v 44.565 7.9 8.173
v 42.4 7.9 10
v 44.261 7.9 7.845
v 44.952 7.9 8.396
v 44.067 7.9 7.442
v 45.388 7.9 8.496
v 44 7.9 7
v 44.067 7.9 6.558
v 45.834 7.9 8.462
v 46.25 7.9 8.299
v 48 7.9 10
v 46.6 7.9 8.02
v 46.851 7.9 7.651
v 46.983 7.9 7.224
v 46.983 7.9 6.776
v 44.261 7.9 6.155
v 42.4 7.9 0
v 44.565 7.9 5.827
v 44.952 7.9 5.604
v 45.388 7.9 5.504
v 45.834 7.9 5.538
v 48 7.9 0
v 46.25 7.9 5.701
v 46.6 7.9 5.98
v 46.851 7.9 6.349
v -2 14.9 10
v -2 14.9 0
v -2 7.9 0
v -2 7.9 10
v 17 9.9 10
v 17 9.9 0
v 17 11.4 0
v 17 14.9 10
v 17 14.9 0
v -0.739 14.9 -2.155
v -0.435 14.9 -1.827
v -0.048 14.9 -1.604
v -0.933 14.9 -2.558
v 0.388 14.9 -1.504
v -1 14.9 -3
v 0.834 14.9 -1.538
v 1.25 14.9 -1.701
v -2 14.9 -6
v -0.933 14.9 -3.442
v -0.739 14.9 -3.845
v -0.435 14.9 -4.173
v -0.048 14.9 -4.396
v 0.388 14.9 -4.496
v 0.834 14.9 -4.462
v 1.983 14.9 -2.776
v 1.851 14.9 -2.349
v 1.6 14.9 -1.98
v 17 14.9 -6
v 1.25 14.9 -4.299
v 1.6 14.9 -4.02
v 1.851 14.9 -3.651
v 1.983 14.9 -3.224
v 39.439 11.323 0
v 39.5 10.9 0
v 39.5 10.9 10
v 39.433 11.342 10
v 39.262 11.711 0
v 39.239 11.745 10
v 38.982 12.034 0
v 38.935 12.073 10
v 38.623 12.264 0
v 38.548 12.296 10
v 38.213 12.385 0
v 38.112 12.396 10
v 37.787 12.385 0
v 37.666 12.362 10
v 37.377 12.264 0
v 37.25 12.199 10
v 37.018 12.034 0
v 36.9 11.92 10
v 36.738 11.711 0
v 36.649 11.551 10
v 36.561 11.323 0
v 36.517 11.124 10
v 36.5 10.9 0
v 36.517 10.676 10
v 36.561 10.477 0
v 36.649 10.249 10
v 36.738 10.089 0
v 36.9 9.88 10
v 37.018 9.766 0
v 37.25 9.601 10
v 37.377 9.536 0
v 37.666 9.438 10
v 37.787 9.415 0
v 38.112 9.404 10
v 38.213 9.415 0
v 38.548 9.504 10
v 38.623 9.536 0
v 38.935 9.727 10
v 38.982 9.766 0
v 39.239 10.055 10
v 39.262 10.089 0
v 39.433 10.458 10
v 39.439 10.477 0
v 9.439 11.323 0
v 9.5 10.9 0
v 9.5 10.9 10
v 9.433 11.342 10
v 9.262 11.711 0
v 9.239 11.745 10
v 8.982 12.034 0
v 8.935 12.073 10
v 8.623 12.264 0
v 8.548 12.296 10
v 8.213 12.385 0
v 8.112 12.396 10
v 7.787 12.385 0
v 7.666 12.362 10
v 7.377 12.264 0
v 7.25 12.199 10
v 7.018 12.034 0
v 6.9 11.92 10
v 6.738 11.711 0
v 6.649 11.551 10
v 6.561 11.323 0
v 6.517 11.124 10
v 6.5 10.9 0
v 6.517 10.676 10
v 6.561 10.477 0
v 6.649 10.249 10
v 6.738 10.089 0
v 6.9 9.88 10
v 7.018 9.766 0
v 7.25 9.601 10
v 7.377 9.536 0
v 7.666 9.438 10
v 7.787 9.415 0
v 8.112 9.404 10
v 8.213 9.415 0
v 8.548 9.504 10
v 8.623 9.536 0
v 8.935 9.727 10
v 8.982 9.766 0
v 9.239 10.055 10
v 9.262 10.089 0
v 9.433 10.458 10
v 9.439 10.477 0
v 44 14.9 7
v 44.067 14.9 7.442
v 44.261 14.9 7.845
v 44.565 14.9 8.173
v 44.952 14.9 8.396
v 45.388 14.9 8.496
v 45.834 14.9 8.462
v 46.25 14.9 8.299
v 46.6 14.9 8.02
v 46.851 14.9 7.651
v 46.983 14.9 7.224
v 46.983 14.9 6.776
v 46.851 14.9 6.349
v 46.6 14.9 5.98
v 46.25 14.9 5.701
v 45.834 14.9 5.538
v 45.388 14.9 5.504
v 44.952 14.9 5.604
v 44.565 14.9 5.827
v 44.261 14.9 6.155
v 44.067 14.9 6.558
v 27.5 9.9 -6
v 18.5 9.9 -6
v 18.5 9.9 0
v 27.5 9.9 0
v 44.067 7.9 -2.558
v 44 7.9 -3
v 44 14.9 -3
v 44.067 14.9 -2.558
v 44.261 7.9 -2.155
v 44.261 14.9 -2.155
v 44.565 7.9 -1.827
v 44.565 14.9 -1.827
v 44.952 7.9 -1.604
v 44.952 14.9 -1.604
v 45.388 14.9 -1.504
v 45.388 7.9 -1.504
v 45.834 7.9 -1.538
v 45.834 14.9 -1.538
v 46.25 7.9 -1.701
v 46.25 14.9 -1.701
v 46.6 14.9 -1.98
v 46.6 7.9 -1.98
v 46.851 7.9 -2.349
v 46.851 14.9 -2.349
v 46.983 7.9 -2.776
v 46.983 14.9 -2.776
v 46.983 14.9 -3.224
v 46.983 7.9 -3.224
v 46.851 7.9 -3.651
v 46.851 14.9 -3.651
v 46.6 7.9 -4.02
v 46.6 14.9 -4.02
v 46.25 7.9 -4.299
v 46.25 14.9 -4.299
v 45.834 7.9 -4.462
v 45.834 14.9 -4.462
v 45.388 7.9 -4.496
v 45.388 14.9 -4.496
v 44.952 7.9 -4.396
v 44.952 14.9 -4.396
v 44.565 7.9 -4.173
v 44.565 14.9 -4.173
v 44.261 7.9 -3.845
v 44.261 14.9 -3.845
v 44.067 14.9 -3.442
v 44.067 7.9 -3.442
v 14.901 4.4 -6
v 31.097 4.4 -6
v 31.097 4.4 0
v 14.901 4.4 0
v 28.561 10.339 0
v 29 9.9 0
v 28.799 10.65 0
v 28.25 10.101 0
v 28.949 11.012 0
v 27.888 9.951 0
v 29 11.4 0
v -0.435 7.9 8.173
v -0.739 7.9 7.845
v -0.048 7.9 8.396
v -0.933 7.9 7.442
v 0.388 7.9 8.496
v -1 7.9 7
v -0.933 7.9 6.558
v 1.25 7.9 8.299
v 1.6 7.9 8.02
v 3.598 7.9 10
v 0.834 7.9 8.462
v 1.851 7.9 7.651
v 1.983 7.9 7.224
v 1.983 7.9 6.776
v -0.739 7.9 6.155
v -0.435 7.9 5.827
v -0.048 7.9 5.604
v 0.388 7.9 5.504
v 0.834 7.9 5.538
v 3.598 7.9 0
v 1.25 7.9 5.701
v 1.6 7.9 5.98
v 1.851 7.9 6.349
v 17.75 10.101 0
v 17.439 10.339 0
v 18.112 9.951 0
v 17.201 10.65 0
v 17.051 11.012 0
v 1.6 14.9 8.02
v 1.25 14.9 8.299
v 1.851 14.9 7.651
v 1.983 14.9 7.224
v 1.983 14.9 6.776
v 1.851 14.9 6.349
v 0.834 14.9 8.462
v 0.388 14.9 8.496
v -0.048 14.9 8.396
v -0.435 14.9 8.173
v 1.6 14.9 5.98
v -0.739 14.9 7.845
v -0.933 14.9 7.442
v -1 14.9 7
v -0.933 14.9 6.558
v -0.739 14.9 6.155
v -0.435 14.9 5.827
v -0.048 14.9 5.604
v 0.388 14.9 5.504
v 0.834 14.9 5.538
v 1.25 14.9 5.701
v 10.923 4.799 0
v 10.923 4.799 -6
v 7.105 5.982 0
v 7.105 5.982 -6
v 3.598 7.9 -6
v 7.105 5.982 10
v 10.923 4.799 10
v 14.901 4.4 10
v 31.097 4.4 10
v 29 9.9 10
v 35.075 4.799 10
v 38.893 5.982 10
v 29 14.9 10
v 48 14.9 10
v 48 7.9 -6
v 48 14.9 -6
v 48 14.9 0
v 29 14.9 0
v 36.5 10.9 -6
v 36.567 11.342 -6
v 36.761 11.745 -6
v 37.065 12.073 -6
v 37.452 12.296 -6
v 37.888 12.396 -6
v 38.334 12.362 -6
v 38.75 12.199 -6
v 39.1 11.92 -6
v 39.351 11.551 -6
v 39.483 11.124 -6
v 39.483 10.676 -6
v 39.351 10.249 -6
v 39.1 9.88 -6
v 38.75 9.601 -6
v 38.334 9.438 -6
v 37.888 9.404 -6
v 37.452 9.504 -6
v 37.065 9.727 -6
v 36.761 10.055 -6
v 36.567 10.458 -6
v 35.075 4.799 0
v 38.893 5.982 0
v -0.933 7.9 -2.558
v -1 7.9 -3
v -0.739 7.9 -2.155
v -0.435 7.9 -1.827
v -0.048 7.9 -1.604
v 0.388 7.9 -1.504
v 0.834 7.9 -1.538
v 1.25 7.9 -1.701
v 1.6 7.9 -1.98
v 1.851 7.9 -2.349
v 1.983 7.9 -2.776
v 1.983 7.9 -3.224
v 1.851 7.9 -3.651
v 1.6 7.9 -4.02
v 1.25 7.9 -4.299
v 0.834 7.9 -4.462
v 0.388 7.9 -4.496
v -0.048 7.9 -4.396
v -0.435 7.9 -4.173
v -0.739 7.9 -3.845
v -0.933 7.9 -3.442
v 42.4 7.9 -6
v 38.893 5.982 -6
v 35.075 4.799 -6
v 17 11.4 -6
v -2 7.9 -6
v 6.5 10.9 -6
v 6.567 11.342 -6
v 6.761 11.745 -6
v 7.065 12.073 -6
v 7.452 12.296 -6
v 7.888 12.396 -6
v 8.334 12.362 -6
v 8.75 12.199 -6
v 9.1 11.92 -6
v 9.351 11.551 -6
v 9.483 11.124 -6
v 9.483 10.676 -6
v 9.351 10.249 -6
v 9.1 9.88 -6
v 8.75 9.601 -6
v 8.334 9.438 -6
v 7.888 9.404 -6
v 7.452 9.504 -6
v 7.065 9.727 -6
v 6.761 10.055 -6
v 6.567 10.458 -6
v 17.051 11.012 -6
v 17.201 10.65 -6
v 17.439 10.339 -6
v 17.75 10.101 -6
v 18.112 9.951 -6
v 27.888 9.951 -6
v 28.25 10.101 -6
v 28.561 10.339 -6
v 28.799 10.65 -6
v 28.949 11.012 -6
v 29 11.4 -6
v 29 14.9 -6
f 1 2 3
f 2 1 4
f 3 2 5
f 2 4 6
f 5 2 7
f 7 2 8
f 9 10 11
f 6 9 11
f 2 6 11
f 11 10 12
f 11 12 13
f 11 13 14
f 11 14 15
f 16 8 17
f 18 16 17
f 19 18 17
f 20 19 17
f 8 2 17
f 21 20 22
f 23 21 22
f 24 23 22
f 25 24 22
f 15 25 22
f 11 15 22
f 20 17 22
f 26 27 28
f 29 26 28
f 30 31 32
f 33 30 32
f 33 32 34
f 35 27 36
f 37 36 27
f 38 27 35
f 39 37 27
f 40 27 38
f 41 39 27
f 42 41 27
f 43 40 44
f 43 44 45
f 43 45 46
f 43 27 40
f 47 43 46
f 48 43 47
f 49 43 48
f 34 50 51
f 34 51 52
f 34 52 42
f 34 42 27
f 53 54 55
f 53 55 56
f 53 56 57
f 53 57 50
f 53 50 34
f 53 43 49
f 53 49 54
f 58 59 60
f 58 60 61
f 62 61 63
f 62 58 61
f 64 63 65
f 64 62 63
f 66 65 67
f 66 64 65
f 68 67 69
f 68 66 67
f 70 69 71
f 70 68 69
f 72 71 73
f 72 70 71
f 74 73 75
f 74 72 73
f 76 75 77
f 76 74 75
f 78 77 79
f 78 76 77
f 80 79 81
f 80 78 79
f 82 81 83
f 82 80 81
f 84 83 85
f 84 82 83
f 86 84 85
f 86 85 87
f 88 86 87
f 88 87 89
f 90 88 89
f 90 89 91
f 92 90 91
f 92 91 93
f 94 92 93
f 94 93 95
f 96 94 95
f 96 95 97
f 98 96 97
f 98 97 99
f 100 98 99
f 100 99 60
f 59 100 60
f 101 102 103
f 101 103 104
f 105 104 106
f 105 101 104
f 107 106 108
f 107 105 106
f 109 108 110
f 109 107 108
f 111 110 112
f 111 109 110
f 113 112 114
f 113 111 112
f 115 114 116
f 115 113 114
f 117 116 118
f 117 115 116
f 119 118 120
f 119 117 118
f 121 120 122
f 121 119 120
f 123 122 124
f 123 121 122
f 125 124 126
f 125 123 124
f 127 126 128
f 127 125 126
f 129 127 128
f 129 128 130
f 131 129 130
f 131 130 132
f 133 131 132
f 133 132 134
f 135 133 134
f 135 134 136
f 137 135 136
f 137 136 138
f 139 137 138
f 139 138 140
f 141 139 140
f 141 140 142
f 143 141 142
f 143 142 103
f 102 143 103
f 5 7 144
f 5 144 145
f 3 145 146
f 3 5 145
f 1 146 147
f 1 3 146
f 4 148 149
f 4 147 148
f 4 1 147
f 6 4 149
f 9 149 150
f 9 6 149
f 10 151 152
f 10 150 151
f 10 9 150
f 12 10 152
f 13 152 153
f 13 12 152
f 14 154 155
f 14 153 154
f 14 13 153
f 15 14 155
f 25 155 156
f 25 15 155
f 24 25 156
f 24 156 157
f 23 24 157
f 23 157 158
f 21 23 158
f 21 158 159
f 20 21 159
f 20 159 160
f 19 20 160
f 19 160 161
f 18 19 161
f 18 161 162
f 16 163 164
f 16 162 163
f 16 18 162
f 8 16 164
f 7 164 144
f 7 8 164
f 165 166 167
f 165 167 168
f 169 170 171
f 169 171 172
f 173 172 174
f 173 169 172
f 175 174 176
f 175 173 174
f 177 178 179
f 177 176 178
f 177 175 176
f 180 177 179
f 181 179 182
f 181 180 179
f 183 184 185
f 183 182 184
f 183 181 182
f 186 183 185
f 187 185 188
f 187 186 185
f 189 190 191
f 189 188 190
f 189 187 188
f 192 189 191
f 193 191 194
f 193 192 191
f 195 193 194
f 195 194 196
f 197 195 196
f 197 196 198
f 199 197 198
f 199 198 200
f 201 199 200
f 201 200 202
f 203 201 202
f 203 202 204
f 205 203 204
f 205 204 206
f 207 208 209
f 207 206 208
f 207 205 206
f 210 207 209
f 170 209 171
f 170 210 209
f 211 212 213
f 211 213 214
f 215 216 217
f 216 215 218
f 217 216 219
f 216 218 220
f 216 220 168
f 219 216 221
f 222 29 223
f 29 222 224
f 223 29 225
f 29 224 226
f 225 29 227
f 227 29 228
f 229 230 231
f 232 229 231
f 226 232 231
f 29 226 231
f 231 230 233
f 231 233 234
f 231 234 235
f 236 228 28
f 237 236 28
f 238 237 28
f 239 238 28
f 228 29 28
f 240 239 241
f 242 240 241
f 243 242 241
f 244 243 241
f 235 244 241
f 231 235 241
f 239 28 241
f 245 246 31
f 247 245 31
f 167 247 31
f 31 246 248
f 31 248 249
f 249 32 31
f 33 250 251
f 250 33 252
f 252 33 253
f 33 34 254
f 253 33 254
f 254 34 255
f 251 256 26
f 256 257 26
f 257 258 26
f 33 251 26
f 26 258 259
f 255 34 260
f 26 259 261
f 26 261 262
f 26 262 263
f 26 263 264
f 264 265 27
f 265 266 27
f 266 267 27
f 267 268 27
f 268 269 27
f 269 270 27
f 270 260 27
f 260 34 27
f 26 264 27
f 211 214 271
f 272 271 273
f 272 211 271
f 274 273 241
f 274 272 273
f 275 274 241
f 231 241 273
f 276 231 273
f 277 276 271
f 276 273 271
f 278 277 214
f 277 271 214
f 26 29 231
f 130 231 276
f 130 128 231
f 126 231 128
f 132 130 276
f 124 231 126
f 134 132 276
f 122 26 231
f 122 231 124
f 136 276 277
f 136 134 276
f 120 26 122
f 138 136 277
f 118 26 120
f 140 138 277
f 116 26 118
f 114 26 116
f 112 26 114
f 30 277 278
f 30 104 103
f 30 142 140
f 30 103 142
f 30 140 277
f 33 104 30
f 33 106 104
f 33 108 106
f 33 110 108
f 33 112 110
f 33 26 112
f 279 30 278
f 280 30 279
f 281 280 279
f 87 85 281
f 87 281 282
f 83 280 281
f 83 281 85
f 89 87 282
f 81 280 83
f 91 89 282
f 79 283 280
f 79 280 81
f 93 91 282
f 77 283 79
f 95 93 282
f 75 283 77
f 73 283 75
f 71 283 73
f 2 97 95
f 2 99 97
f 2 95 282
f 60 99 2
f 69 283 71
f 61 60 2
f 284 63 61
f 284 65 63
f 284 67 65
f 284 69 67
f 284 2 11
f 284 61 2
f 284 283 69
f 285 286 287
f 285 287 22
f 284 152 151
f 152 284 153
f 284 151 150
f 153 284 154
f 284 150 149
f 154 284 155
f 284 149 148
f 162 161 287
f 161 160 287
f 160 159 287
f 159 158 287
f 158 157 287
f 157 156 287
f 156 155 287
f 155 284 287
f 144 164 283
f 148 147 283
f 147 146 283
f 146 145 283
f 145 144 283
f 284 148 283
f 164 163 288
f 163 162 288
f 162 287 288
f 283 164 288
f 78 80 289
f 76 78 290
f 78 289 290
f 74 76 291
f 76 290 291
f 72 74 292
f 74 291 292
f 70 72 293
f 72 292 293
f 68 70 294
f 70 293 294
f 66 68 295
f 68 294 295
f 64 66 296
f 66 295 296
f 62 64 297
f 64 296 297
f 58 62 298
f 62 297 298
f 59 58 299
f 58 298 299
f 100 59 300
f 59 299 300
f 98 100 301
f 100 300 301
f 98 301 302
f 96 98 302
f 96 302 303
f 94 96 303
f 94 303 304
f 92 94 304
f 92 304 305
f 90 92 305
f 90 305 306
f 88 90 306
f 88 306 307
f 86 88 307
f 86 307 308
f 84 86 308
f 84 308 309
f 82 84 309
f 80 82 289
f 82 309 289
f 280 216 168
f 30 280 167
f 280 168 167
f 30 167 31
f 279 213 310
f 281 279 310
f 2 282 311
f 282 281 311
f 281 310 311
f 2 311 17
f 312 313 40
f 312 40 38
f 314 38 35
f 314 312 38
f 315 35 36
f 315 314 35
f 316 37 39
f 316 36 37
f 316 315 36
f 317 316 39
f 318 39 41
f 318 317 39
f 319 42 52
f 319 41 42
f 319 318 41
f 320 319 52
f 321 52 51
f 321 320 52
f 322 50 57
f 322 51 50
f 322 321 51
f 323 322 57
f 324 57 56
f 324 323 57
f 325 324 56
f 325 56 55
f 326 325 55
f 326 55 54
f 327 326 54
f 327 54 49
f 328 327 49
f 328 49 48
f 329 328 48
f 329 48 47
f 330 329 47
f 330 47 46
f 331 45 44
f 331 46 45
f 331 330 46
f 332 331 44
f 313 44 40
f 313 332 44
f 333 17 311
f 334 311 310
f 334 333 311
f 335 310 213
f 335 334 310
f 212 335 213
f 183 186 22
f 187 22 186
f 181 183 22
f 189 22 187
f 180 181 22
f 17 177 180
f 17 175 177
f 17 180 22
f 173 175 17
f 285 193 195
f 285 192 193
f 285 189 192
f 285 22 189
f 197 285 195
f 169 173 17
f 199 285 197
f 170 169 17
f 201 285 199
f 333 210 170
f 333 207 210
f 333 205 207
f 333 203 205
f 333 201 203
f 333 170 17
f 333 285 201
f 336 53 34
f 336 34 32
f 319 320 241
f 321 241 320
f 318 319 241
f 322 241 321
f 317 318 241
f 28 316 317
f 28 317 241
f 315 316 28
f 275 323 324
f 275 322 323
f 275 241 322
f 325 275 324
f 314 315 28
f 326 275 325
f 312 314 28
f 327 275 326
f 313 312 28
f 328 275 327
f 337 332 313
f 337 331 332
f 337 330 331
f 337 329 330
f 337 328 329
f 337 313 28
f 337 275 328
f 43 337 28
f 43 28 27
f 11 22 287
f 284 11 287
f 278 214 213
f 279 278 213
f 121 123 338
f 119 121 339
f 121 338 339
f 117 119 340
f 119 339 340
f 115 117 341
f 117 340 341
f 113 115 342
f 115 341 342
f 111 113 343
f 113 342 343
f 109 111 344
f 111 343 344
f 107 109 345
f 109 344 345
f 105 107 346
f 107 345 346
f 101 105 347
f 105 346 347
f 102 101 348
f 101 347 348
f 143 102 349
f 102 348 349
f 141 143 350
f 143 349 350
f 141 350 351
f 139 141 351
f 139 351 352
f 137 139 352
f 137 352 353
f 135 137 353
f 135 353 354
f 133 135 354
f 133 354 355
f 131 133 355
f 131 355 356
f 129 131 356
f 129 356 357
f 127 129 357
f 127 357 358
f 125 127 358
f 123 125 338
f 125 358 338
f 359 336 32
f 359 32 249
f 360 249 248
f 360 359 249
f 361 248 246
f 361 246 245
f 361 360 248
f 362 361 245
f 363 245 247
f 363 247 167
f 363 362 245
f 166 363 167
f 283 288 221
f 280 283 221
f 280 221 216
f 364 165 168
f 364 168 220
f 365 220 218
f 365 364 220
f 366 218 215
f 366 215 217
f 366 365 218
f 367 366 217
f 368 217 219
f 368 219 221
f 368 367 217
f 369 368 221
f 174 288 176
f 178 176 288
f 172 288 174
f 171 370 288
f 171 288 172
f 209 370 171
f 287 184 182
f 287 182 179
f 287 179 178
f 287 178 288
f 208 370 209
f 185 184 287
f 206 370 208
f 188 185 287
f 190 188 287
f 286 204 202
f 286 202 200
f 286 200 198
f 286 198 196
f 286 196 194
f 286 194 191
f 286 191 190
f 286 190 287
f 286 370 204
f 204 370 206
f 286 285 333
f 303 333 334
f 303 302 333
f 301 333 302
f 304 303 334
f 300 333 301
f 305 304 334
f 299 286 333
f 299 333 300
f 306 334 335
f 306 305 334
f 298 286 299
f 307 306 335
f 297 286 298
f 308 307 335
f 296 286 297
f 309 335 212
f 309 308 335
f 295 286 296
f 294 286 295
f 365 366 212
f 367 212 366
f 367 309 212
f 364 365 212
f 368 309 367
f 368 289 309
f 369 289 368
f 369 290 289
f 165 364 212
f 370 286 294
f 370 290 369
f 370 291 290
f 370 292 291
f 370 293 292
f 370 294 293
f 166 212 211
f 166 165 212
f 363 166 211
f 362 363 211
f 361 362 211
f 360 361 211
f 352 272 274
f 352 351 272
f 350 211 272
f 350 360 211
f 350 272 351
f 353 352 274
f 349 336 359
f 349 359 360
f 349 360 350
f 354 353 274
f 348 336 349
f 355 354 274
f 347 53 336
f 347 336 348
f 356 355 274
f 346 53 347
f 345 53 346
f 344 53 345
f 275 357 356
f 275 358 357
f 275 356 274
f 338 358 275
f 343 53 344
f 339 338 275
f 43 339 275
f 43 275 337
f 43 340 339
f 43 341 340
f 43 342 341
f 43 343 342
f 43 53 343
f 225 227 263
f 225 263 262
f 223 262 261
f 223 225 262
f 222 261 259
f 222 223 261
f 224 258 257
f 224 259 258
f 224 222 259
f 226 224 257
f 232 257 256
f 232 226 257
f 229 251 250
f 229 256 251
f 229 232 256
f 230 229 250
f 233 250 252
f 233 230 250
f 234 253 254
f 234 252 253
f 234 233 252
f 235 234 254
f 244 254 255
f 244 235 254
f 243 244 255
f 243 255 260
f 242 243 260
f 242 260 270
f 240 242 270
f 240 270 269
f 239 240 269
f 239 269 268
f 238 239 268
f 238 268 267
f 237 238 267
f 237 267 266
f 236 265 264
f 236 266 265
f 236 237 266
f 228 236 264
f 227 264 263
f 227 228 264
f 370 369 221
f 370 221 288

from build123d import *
from build123d.topology import SkipClean

# Parameters (mm, degrees)
SKETCH7_R               = 1.5
BOSS_EXTRUDE11_DEPTH    = 10
FILLET1_R               = 20
BOSS_EXTRUDE12_START    = 6
SKETCH9_R               = 1.5
BOSS_EXTRUDE12_DEPTH    = 6
CUT_EXTRUDE1_DEPTH      = 51.142297514
CUT_EXTRUDE1_DEPTH_BACK = 51.142297514
SKETCH10_R              = 1.5


with BuildPart() as part:
    # Sketch7 → Boss-Extrude11 (new body)
    with BuildSketch(Plane.XY):
        Polygon((11, 14.9), (-2, 14.9), (-2, 7.9), (3.598076211, 7.9), (3.598076211, 4.4), (42.4, 4.4), (42.4, 7.9), (48, 7.9), (48, 14.9), (35, 14.9), (29, 14.9), (29, 9.9), (17, 9.9), (17, 14.9), align=None)
        with Locations((8, 10.9)):
            Circle(SKETCH7_R, mode=Mode.SUBTRACT)
        with Locations((38, 10.9)):
            Circle(SKETCH7_R, mode=Mode.SUBTRACT)
    extrude(amount=BOSS_EXTRUDE11_DEPTH)

    # Fillet1
    # the kernel refuses this fillet: 20 mm, written as the material it takes off along each edge
    with BuildSketch(Plane(origin=(42.4, 4.4, -28.256636389), x_dir=(-1.4210854715172548e-12, 1.0, 0), z_dir=(0, 0, 1))) as fillet1_piece_1:
        with BuildLine():
            CenterArc((20, 11.302654555), FILLET1_R, 180, 34.41150867)
            Line((0, 11.302654555), (-0.4, 11.302654555))
            Line((-0.4, 11.302654555), (-0.4, 0))
            Line((-0.4, 0), (0, -0.4))
            ThreePointArc((0, -0.4), (1.75, -0.4), (3.17, -0.226053091))
            Line((3.17, -0.226053091), (3.5, 0))
        make_face()
    extrude(amount=66.513272777, mode=Mode.SUBTRACT)
    with BuildSketch(Plane(origin=(3.598076211, 4.4, -28.256636389), x_dir=(1, 0, 0), z_dir=(0, 0, 1))) as fillet1_piece_2:
        with BuildLine():
            CenterArc((11.302654555, 20), FILLET1_R, 235.58849133, 34.41150867)
            Line((0, 3.5), (-0.226053091, 3.17))
            ThreePointArc((-0.226053091, 3.17), (-0.4, 1.75), (-0.4, 0))
            Line((-0.4, 0), (0, -0.4))
            Line((0, -0.4), (11.302654555, -0.4))
            Line((11.302654555, -0.4), (11.302654555, 0))
        make_face()
    extrude(amount=66.513272777, mode=Mode.SUBTRACT)

    # Sketch9 → Boss-Extrude12 (add)
    with SkipClean():  # the faces are left unmerged after this step: merging them gives an invalid solid
        with BuildSketch(Plane(origin=(0, 0, 0), x_dir=(-1, 0, 0), z_dir=(0, 0, -1)).offset(BOSS_EXTRUDE12_START)):
            with BuildLine():
                Line((-48, 7.9), (-42.4, 7.9))
                ThreePointArc((-42.4, 7.9), (-37.013425228, 5.295026825), (-31.097345445, 4.4))
                Line((-31.097345445, 4.4), (-14.900730767, 4.4))
                ThreePointArc((-14.900730767, 4.4), (-8.984650984, 5.295026825), (-3.598076211, 7.9))
                Line((-3.598076211, 7.9), (2, 7.9))
                Line((2, 7.9), (2, 14.9))
                Line((2, 14.9), (-17, 14.9))
                Line((-17, 14.9), (-17, 11.4))
                ThreePointArc((-17, 11.4), (-17.439339828, 10.339339828), (-18.5, 9.9))
                Line((-18.5, 9.9), (-27.5, 9.9))
                ThreePointArc((-27.5, 9.9), (-28.560660172, 10.339339828), (-29, 11.4))
                Line((-29, 11.4), (-29, 14.9))
                Line((-29, 14.9), (-48, 14.9))
                Line((-48, 14.9), (-48, 7.9))
            make_face()
            with Locations((-38, 10.9)):
                Circle(SKETCH9_R, mode=Mode.SUBTRACT)
            with Locations((-8, 10.9)):
                Circle(SKETCH9_R, mode=Mode.SUBTRACT)
        extrude(amount=-BOSS_EXTRUDE12_DEPTH)

    # Sketch10 → Cut-Extrude1 (cut, two sides: drawn at the far end of the back side and taken through both)
    with SkipClean():  # the faces are left unmerged after this step: merging them gives an invalid solid
        with BuildSketch(Plane(origin=(0, 14.9, 0), x_dir=(1, 0, 0), z_dir=(0, 1, 0)).offset(-CUT_EXTRUDE1_DEPTH_BACK)):
            with Locations(Location((0.5, -7, 0), (0, 0, 180))):
                Circle(SKETCH10_R)
            with Locations(Location((0.5, 3, 0), (0, 0, 180))):
                Circle(SKETCH10_R)
            with Locations(Location((45.5, -7, 0), (0, 0, 180))):
                Circle(SKETCH10_R)
            with Locations(Location((45.5, 3, 0), (0, 0, 180))):
                Circle(SKETCH10_R)
        extrude(amount=CUT_EXTRUDE1_DEPTH + CUT_EXTRUDE1_DEPTH_BACK, mode=Mode.SUBTRACT)


solid = part.part
